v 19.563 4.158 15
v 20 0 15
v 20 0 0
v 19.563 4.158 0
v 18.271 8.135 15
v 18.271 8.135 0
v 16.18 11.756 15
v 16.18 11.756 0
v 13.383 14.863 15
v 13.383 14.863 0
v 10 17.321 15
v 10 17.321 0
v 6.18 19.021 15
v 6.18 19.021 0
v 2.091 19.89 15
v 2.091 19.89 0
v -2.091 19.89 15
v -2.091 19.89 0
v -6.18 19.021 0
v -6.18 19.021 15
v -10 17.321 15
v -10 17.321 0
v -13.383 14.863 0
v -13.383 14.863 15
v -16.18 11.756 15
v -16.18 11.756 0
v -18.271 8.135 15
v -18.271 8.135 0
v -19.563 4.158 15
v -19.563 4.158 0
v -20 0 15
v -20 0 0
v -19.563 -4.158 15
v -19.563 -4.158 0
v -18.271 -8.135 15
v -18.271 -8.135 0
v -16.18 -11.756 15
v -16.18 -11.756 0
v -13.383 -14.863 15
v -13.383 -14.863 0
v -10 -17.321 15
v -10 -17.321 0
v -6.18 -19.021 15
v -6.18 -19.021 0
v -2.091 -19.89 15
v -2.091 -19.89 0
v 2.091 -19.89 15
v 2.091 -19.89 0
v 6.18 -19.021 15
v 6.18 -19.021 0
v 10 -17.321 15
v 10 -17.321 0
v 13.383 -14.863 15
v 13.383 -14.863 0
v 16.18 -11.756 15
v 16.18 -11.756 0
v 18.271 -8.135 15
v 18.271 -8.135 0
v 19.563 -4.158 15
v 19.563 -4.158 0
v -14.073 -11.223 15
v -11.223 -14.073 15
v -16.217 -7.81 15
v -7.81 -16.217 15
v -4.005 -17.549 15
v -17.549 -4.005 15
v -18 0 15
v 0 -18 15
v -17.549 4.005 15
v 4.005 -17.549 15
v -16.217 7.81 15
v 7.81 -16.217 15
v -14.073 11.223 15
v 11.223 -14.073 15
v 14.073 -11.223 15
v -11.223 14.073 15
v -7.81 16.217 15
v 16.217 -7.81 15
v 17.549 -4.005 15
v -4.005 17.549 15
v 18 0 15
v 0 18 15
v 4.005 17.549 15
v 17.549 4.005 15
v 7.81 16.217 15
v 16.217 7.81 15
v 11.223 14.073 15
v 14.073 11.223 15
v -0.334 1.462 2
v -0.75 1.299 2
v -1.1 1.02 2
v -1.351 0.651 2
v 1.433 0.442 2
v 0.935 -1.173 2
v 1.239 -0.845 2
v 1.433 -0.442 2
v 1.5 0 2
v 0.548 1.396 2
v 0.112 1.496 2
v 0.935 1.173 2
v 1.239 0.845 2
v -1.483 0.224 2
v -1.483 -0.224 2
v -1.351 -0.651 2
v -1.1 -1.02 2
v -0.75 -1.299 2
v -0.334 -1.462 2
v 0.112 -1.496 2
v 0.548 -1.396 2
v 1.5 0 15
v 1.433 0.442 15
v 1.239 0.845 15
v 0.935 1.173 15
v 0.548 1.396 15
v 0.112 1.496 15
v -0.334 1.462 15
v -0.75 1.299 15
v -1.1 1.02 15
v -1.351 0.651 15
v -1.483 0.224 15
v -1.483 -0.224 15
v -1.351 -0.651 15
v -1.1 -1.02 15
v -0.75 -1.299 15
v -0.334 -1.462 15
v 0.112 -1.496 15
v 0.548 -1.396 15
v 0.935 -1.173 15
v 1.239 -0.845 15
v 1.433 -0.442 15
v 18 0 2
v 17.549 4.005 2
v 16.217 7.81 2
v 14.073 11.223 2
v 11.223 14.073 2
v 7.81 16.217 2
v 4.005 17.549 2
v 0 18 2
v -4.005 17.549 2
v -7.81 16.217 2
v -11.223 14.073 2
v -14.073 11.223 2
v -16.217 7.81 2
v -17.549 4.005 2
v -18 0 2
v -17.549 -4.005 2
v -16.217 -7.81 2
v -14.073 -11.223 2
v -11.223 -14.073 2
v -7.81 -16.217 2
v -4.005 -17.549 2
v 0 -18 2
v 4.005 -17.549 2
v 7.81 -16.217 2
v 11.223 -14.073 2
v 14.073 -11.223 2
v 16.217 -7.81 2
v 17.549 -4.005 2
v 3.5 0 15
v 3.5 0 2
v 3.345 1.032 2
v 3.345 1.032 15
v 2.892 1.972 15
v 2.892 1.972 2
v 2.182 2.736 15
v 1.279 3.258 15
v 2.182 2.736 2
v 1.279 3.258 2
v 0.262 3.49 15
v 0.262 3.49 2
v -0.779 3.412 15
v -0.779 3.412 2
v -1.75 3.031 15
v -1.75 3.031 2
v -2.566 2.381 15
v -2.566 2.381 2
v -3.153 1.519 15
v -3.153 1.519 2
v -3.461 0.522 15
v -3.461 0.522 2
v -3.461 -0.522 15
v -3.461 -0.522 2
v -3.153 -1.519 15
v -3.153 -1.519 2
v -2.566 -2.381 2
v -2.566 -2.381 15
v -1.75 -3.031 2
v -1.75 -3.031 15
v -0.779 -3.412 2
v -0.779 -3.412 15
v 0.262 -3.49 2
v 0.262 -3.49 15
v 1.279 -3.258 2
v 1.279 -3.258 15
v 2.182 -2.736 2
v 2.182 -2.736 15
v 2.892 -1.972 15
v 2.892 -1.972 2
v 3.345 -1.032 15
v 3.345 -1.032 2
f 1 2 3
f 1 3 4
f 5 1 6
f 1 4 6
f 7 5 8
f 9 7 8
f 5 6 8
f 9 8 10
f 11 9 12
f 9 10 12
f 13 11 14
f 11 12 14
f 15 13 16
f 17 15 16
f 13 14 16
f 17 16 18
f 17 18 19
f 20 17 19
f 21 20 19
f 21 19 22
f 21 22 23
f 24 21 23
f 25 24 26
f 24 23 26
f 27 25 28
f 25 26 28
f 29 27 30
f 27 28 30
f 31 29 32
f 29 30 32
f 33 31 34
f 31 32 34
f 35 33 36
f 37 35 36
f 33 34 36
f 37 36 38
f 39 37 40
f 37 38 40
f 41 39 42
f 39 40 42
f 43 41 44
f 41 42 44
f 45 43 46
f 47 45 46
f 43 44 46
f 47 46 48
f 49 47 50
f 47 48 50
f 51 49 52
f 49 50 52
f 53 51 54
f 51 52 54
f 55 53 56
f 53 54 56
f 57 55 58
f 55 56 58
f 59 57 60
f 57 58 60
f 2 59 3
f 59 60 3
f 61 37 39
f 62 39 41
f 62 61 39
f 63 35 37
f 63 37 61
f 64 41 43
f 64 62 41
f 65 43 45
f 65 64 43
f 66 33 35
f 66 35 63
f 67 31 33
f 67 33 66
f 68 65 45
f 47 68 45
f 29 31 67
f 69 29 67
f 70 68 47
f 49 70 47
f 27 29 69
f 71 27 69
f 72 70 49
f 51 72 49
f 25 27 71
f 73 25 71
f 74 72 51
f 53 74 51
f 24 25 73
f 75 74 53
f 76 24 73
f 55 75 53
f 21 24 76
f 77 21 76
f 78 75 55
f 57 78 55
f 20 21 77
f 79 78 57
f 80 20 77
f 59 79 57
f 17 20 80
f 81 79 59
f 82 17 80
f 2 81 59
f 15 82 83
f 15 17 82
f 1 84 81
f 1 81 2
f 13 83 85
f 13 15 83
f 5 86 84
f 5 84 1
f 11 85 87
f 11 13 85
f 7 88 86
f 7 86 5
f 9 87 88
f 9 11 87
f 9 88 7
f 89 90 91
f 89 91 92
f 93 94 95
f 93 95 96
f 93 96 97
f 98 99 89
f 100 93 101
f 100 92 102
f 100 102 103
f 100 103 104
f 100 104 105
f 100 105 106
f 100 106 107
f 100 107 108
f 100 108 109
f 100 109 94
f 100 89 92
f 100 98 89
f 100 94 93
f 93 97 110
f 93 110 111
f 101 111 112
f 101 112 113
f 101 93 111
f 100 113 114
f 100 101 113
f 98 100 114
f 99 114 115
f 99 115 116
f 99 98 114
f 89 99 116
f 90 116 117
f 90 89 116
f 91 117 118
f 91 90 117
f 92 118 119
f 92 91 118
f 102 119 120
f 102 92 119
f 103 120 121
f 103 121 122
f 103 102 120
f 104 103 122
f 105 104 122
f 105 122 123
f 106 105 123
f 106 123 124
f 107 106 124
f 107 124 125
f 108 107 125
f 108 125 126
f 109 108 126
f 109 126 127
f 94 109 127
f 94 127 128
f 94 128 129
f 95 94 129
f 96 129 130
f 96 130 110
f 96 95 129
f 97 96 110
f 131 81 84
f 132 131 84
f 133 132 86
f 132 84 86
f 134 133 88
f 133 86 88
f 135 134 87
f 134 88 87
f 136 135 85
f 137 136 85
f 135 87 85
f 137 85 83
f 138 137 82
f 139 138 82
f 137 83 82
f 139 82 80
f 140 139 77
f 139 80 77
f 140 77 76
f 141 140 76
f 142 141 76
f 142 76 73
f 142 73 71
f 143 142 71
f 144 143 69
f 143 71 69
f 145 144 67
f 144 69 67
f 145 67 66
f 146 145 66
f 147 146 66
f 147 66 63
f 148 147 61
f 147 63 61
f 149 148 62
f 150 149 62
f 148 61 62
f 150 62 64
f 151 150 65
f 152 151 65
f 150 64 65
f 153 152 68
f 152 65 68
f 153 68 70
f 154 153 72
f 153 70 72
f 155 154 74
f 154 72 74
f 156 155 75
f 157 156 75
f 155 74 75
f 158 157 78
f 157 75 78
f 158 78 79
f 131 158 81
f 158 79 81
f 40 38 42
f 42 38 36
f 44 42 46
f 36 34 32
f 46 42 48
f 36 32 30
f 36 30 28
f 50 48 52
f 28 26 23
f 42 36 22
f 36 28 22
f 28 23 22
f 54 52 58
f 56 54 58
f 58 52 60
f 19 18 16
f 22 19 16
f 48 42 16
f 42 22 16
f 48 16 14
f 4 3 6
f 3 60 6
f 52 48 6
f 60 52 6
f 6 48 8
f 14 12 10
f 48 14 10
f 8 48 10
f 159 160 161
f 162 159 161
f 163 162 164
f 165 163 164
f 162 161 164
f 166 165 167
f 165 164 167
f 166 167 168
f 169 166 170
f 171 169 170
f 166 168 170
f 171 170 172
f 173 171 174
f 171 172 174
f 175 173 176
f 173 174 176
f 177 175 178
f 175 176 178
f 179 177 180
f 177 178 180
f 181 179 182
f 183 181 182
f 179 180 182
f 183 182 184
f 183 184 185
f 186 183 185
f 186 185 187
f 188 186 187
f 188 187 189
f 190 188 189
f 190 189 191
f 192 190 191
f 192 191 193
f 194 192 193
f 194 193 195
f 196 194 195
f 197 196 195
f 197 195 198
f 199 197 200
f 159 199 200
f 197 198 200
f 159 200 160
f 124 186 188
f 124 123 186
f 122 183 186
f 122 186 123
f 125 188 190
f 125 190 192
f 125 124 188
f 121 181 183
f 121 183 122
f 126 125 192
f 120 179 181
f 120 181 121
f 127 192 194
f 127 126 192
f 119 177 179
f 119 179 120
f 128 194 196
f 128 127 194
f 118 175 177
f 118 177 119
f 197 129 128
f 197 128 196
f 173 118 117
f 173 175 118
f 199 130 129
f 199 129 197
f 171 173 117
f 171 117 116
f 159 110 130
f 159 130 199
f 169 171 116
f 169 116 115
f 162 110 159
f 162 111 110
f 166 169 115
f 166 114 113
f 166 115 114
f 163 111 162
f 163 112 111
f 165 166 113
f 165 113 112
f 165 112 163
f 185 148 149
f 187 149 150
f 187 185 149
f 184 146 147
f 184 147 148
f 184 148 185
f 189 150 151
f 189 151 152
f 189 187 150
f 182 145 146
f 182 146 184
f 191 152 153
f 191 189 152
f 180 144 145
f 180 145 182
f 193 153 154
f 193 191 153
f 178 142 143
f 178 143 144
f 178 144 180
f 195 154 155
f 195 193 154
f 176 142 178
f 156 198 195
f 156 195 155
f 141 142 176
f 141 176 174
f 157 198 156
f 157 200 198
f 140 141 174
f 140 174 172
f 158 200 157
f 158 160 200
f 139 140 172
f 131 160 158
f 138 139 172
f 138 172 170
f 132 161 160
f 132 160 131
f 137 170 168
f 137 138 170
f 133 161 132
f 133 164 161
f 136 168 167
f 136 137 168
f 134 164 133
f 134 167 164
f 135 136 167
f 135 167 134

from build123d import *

# Parameters (mm, degrees)
F0_R     = 20
F1_DEPTH = 15
F2_R     = 18
F3_DEPTH = 13
F4_R     = 3.5
F4_R_2   = 1.5
F5_DEPTH = 13


with BuildPart() as f1:
    # F0 (on Top) → F1 (new body)
    with BuildSketch(Plane.XY):
        Circle(F0_R)
    extrude(amount=F1_DEPTH)

    # F2 (on face) → F3 (cut)
    with BuildSketch(Plane.XY.offset(15)):
        Circle(F2_R)
    extrude(amount=-F3_DEPTH, mode=Mode.SUBTRACT)

    # F4 (on face) → F5 (join)
    with BuildSketch(Plane.XY.offset(2)):
        Circle(F4_R)
        Circle(F4_R_2, mode=Mode.SUBTRACT)
    extrude(amount=F5_DEPTH)


solid = f1.part
